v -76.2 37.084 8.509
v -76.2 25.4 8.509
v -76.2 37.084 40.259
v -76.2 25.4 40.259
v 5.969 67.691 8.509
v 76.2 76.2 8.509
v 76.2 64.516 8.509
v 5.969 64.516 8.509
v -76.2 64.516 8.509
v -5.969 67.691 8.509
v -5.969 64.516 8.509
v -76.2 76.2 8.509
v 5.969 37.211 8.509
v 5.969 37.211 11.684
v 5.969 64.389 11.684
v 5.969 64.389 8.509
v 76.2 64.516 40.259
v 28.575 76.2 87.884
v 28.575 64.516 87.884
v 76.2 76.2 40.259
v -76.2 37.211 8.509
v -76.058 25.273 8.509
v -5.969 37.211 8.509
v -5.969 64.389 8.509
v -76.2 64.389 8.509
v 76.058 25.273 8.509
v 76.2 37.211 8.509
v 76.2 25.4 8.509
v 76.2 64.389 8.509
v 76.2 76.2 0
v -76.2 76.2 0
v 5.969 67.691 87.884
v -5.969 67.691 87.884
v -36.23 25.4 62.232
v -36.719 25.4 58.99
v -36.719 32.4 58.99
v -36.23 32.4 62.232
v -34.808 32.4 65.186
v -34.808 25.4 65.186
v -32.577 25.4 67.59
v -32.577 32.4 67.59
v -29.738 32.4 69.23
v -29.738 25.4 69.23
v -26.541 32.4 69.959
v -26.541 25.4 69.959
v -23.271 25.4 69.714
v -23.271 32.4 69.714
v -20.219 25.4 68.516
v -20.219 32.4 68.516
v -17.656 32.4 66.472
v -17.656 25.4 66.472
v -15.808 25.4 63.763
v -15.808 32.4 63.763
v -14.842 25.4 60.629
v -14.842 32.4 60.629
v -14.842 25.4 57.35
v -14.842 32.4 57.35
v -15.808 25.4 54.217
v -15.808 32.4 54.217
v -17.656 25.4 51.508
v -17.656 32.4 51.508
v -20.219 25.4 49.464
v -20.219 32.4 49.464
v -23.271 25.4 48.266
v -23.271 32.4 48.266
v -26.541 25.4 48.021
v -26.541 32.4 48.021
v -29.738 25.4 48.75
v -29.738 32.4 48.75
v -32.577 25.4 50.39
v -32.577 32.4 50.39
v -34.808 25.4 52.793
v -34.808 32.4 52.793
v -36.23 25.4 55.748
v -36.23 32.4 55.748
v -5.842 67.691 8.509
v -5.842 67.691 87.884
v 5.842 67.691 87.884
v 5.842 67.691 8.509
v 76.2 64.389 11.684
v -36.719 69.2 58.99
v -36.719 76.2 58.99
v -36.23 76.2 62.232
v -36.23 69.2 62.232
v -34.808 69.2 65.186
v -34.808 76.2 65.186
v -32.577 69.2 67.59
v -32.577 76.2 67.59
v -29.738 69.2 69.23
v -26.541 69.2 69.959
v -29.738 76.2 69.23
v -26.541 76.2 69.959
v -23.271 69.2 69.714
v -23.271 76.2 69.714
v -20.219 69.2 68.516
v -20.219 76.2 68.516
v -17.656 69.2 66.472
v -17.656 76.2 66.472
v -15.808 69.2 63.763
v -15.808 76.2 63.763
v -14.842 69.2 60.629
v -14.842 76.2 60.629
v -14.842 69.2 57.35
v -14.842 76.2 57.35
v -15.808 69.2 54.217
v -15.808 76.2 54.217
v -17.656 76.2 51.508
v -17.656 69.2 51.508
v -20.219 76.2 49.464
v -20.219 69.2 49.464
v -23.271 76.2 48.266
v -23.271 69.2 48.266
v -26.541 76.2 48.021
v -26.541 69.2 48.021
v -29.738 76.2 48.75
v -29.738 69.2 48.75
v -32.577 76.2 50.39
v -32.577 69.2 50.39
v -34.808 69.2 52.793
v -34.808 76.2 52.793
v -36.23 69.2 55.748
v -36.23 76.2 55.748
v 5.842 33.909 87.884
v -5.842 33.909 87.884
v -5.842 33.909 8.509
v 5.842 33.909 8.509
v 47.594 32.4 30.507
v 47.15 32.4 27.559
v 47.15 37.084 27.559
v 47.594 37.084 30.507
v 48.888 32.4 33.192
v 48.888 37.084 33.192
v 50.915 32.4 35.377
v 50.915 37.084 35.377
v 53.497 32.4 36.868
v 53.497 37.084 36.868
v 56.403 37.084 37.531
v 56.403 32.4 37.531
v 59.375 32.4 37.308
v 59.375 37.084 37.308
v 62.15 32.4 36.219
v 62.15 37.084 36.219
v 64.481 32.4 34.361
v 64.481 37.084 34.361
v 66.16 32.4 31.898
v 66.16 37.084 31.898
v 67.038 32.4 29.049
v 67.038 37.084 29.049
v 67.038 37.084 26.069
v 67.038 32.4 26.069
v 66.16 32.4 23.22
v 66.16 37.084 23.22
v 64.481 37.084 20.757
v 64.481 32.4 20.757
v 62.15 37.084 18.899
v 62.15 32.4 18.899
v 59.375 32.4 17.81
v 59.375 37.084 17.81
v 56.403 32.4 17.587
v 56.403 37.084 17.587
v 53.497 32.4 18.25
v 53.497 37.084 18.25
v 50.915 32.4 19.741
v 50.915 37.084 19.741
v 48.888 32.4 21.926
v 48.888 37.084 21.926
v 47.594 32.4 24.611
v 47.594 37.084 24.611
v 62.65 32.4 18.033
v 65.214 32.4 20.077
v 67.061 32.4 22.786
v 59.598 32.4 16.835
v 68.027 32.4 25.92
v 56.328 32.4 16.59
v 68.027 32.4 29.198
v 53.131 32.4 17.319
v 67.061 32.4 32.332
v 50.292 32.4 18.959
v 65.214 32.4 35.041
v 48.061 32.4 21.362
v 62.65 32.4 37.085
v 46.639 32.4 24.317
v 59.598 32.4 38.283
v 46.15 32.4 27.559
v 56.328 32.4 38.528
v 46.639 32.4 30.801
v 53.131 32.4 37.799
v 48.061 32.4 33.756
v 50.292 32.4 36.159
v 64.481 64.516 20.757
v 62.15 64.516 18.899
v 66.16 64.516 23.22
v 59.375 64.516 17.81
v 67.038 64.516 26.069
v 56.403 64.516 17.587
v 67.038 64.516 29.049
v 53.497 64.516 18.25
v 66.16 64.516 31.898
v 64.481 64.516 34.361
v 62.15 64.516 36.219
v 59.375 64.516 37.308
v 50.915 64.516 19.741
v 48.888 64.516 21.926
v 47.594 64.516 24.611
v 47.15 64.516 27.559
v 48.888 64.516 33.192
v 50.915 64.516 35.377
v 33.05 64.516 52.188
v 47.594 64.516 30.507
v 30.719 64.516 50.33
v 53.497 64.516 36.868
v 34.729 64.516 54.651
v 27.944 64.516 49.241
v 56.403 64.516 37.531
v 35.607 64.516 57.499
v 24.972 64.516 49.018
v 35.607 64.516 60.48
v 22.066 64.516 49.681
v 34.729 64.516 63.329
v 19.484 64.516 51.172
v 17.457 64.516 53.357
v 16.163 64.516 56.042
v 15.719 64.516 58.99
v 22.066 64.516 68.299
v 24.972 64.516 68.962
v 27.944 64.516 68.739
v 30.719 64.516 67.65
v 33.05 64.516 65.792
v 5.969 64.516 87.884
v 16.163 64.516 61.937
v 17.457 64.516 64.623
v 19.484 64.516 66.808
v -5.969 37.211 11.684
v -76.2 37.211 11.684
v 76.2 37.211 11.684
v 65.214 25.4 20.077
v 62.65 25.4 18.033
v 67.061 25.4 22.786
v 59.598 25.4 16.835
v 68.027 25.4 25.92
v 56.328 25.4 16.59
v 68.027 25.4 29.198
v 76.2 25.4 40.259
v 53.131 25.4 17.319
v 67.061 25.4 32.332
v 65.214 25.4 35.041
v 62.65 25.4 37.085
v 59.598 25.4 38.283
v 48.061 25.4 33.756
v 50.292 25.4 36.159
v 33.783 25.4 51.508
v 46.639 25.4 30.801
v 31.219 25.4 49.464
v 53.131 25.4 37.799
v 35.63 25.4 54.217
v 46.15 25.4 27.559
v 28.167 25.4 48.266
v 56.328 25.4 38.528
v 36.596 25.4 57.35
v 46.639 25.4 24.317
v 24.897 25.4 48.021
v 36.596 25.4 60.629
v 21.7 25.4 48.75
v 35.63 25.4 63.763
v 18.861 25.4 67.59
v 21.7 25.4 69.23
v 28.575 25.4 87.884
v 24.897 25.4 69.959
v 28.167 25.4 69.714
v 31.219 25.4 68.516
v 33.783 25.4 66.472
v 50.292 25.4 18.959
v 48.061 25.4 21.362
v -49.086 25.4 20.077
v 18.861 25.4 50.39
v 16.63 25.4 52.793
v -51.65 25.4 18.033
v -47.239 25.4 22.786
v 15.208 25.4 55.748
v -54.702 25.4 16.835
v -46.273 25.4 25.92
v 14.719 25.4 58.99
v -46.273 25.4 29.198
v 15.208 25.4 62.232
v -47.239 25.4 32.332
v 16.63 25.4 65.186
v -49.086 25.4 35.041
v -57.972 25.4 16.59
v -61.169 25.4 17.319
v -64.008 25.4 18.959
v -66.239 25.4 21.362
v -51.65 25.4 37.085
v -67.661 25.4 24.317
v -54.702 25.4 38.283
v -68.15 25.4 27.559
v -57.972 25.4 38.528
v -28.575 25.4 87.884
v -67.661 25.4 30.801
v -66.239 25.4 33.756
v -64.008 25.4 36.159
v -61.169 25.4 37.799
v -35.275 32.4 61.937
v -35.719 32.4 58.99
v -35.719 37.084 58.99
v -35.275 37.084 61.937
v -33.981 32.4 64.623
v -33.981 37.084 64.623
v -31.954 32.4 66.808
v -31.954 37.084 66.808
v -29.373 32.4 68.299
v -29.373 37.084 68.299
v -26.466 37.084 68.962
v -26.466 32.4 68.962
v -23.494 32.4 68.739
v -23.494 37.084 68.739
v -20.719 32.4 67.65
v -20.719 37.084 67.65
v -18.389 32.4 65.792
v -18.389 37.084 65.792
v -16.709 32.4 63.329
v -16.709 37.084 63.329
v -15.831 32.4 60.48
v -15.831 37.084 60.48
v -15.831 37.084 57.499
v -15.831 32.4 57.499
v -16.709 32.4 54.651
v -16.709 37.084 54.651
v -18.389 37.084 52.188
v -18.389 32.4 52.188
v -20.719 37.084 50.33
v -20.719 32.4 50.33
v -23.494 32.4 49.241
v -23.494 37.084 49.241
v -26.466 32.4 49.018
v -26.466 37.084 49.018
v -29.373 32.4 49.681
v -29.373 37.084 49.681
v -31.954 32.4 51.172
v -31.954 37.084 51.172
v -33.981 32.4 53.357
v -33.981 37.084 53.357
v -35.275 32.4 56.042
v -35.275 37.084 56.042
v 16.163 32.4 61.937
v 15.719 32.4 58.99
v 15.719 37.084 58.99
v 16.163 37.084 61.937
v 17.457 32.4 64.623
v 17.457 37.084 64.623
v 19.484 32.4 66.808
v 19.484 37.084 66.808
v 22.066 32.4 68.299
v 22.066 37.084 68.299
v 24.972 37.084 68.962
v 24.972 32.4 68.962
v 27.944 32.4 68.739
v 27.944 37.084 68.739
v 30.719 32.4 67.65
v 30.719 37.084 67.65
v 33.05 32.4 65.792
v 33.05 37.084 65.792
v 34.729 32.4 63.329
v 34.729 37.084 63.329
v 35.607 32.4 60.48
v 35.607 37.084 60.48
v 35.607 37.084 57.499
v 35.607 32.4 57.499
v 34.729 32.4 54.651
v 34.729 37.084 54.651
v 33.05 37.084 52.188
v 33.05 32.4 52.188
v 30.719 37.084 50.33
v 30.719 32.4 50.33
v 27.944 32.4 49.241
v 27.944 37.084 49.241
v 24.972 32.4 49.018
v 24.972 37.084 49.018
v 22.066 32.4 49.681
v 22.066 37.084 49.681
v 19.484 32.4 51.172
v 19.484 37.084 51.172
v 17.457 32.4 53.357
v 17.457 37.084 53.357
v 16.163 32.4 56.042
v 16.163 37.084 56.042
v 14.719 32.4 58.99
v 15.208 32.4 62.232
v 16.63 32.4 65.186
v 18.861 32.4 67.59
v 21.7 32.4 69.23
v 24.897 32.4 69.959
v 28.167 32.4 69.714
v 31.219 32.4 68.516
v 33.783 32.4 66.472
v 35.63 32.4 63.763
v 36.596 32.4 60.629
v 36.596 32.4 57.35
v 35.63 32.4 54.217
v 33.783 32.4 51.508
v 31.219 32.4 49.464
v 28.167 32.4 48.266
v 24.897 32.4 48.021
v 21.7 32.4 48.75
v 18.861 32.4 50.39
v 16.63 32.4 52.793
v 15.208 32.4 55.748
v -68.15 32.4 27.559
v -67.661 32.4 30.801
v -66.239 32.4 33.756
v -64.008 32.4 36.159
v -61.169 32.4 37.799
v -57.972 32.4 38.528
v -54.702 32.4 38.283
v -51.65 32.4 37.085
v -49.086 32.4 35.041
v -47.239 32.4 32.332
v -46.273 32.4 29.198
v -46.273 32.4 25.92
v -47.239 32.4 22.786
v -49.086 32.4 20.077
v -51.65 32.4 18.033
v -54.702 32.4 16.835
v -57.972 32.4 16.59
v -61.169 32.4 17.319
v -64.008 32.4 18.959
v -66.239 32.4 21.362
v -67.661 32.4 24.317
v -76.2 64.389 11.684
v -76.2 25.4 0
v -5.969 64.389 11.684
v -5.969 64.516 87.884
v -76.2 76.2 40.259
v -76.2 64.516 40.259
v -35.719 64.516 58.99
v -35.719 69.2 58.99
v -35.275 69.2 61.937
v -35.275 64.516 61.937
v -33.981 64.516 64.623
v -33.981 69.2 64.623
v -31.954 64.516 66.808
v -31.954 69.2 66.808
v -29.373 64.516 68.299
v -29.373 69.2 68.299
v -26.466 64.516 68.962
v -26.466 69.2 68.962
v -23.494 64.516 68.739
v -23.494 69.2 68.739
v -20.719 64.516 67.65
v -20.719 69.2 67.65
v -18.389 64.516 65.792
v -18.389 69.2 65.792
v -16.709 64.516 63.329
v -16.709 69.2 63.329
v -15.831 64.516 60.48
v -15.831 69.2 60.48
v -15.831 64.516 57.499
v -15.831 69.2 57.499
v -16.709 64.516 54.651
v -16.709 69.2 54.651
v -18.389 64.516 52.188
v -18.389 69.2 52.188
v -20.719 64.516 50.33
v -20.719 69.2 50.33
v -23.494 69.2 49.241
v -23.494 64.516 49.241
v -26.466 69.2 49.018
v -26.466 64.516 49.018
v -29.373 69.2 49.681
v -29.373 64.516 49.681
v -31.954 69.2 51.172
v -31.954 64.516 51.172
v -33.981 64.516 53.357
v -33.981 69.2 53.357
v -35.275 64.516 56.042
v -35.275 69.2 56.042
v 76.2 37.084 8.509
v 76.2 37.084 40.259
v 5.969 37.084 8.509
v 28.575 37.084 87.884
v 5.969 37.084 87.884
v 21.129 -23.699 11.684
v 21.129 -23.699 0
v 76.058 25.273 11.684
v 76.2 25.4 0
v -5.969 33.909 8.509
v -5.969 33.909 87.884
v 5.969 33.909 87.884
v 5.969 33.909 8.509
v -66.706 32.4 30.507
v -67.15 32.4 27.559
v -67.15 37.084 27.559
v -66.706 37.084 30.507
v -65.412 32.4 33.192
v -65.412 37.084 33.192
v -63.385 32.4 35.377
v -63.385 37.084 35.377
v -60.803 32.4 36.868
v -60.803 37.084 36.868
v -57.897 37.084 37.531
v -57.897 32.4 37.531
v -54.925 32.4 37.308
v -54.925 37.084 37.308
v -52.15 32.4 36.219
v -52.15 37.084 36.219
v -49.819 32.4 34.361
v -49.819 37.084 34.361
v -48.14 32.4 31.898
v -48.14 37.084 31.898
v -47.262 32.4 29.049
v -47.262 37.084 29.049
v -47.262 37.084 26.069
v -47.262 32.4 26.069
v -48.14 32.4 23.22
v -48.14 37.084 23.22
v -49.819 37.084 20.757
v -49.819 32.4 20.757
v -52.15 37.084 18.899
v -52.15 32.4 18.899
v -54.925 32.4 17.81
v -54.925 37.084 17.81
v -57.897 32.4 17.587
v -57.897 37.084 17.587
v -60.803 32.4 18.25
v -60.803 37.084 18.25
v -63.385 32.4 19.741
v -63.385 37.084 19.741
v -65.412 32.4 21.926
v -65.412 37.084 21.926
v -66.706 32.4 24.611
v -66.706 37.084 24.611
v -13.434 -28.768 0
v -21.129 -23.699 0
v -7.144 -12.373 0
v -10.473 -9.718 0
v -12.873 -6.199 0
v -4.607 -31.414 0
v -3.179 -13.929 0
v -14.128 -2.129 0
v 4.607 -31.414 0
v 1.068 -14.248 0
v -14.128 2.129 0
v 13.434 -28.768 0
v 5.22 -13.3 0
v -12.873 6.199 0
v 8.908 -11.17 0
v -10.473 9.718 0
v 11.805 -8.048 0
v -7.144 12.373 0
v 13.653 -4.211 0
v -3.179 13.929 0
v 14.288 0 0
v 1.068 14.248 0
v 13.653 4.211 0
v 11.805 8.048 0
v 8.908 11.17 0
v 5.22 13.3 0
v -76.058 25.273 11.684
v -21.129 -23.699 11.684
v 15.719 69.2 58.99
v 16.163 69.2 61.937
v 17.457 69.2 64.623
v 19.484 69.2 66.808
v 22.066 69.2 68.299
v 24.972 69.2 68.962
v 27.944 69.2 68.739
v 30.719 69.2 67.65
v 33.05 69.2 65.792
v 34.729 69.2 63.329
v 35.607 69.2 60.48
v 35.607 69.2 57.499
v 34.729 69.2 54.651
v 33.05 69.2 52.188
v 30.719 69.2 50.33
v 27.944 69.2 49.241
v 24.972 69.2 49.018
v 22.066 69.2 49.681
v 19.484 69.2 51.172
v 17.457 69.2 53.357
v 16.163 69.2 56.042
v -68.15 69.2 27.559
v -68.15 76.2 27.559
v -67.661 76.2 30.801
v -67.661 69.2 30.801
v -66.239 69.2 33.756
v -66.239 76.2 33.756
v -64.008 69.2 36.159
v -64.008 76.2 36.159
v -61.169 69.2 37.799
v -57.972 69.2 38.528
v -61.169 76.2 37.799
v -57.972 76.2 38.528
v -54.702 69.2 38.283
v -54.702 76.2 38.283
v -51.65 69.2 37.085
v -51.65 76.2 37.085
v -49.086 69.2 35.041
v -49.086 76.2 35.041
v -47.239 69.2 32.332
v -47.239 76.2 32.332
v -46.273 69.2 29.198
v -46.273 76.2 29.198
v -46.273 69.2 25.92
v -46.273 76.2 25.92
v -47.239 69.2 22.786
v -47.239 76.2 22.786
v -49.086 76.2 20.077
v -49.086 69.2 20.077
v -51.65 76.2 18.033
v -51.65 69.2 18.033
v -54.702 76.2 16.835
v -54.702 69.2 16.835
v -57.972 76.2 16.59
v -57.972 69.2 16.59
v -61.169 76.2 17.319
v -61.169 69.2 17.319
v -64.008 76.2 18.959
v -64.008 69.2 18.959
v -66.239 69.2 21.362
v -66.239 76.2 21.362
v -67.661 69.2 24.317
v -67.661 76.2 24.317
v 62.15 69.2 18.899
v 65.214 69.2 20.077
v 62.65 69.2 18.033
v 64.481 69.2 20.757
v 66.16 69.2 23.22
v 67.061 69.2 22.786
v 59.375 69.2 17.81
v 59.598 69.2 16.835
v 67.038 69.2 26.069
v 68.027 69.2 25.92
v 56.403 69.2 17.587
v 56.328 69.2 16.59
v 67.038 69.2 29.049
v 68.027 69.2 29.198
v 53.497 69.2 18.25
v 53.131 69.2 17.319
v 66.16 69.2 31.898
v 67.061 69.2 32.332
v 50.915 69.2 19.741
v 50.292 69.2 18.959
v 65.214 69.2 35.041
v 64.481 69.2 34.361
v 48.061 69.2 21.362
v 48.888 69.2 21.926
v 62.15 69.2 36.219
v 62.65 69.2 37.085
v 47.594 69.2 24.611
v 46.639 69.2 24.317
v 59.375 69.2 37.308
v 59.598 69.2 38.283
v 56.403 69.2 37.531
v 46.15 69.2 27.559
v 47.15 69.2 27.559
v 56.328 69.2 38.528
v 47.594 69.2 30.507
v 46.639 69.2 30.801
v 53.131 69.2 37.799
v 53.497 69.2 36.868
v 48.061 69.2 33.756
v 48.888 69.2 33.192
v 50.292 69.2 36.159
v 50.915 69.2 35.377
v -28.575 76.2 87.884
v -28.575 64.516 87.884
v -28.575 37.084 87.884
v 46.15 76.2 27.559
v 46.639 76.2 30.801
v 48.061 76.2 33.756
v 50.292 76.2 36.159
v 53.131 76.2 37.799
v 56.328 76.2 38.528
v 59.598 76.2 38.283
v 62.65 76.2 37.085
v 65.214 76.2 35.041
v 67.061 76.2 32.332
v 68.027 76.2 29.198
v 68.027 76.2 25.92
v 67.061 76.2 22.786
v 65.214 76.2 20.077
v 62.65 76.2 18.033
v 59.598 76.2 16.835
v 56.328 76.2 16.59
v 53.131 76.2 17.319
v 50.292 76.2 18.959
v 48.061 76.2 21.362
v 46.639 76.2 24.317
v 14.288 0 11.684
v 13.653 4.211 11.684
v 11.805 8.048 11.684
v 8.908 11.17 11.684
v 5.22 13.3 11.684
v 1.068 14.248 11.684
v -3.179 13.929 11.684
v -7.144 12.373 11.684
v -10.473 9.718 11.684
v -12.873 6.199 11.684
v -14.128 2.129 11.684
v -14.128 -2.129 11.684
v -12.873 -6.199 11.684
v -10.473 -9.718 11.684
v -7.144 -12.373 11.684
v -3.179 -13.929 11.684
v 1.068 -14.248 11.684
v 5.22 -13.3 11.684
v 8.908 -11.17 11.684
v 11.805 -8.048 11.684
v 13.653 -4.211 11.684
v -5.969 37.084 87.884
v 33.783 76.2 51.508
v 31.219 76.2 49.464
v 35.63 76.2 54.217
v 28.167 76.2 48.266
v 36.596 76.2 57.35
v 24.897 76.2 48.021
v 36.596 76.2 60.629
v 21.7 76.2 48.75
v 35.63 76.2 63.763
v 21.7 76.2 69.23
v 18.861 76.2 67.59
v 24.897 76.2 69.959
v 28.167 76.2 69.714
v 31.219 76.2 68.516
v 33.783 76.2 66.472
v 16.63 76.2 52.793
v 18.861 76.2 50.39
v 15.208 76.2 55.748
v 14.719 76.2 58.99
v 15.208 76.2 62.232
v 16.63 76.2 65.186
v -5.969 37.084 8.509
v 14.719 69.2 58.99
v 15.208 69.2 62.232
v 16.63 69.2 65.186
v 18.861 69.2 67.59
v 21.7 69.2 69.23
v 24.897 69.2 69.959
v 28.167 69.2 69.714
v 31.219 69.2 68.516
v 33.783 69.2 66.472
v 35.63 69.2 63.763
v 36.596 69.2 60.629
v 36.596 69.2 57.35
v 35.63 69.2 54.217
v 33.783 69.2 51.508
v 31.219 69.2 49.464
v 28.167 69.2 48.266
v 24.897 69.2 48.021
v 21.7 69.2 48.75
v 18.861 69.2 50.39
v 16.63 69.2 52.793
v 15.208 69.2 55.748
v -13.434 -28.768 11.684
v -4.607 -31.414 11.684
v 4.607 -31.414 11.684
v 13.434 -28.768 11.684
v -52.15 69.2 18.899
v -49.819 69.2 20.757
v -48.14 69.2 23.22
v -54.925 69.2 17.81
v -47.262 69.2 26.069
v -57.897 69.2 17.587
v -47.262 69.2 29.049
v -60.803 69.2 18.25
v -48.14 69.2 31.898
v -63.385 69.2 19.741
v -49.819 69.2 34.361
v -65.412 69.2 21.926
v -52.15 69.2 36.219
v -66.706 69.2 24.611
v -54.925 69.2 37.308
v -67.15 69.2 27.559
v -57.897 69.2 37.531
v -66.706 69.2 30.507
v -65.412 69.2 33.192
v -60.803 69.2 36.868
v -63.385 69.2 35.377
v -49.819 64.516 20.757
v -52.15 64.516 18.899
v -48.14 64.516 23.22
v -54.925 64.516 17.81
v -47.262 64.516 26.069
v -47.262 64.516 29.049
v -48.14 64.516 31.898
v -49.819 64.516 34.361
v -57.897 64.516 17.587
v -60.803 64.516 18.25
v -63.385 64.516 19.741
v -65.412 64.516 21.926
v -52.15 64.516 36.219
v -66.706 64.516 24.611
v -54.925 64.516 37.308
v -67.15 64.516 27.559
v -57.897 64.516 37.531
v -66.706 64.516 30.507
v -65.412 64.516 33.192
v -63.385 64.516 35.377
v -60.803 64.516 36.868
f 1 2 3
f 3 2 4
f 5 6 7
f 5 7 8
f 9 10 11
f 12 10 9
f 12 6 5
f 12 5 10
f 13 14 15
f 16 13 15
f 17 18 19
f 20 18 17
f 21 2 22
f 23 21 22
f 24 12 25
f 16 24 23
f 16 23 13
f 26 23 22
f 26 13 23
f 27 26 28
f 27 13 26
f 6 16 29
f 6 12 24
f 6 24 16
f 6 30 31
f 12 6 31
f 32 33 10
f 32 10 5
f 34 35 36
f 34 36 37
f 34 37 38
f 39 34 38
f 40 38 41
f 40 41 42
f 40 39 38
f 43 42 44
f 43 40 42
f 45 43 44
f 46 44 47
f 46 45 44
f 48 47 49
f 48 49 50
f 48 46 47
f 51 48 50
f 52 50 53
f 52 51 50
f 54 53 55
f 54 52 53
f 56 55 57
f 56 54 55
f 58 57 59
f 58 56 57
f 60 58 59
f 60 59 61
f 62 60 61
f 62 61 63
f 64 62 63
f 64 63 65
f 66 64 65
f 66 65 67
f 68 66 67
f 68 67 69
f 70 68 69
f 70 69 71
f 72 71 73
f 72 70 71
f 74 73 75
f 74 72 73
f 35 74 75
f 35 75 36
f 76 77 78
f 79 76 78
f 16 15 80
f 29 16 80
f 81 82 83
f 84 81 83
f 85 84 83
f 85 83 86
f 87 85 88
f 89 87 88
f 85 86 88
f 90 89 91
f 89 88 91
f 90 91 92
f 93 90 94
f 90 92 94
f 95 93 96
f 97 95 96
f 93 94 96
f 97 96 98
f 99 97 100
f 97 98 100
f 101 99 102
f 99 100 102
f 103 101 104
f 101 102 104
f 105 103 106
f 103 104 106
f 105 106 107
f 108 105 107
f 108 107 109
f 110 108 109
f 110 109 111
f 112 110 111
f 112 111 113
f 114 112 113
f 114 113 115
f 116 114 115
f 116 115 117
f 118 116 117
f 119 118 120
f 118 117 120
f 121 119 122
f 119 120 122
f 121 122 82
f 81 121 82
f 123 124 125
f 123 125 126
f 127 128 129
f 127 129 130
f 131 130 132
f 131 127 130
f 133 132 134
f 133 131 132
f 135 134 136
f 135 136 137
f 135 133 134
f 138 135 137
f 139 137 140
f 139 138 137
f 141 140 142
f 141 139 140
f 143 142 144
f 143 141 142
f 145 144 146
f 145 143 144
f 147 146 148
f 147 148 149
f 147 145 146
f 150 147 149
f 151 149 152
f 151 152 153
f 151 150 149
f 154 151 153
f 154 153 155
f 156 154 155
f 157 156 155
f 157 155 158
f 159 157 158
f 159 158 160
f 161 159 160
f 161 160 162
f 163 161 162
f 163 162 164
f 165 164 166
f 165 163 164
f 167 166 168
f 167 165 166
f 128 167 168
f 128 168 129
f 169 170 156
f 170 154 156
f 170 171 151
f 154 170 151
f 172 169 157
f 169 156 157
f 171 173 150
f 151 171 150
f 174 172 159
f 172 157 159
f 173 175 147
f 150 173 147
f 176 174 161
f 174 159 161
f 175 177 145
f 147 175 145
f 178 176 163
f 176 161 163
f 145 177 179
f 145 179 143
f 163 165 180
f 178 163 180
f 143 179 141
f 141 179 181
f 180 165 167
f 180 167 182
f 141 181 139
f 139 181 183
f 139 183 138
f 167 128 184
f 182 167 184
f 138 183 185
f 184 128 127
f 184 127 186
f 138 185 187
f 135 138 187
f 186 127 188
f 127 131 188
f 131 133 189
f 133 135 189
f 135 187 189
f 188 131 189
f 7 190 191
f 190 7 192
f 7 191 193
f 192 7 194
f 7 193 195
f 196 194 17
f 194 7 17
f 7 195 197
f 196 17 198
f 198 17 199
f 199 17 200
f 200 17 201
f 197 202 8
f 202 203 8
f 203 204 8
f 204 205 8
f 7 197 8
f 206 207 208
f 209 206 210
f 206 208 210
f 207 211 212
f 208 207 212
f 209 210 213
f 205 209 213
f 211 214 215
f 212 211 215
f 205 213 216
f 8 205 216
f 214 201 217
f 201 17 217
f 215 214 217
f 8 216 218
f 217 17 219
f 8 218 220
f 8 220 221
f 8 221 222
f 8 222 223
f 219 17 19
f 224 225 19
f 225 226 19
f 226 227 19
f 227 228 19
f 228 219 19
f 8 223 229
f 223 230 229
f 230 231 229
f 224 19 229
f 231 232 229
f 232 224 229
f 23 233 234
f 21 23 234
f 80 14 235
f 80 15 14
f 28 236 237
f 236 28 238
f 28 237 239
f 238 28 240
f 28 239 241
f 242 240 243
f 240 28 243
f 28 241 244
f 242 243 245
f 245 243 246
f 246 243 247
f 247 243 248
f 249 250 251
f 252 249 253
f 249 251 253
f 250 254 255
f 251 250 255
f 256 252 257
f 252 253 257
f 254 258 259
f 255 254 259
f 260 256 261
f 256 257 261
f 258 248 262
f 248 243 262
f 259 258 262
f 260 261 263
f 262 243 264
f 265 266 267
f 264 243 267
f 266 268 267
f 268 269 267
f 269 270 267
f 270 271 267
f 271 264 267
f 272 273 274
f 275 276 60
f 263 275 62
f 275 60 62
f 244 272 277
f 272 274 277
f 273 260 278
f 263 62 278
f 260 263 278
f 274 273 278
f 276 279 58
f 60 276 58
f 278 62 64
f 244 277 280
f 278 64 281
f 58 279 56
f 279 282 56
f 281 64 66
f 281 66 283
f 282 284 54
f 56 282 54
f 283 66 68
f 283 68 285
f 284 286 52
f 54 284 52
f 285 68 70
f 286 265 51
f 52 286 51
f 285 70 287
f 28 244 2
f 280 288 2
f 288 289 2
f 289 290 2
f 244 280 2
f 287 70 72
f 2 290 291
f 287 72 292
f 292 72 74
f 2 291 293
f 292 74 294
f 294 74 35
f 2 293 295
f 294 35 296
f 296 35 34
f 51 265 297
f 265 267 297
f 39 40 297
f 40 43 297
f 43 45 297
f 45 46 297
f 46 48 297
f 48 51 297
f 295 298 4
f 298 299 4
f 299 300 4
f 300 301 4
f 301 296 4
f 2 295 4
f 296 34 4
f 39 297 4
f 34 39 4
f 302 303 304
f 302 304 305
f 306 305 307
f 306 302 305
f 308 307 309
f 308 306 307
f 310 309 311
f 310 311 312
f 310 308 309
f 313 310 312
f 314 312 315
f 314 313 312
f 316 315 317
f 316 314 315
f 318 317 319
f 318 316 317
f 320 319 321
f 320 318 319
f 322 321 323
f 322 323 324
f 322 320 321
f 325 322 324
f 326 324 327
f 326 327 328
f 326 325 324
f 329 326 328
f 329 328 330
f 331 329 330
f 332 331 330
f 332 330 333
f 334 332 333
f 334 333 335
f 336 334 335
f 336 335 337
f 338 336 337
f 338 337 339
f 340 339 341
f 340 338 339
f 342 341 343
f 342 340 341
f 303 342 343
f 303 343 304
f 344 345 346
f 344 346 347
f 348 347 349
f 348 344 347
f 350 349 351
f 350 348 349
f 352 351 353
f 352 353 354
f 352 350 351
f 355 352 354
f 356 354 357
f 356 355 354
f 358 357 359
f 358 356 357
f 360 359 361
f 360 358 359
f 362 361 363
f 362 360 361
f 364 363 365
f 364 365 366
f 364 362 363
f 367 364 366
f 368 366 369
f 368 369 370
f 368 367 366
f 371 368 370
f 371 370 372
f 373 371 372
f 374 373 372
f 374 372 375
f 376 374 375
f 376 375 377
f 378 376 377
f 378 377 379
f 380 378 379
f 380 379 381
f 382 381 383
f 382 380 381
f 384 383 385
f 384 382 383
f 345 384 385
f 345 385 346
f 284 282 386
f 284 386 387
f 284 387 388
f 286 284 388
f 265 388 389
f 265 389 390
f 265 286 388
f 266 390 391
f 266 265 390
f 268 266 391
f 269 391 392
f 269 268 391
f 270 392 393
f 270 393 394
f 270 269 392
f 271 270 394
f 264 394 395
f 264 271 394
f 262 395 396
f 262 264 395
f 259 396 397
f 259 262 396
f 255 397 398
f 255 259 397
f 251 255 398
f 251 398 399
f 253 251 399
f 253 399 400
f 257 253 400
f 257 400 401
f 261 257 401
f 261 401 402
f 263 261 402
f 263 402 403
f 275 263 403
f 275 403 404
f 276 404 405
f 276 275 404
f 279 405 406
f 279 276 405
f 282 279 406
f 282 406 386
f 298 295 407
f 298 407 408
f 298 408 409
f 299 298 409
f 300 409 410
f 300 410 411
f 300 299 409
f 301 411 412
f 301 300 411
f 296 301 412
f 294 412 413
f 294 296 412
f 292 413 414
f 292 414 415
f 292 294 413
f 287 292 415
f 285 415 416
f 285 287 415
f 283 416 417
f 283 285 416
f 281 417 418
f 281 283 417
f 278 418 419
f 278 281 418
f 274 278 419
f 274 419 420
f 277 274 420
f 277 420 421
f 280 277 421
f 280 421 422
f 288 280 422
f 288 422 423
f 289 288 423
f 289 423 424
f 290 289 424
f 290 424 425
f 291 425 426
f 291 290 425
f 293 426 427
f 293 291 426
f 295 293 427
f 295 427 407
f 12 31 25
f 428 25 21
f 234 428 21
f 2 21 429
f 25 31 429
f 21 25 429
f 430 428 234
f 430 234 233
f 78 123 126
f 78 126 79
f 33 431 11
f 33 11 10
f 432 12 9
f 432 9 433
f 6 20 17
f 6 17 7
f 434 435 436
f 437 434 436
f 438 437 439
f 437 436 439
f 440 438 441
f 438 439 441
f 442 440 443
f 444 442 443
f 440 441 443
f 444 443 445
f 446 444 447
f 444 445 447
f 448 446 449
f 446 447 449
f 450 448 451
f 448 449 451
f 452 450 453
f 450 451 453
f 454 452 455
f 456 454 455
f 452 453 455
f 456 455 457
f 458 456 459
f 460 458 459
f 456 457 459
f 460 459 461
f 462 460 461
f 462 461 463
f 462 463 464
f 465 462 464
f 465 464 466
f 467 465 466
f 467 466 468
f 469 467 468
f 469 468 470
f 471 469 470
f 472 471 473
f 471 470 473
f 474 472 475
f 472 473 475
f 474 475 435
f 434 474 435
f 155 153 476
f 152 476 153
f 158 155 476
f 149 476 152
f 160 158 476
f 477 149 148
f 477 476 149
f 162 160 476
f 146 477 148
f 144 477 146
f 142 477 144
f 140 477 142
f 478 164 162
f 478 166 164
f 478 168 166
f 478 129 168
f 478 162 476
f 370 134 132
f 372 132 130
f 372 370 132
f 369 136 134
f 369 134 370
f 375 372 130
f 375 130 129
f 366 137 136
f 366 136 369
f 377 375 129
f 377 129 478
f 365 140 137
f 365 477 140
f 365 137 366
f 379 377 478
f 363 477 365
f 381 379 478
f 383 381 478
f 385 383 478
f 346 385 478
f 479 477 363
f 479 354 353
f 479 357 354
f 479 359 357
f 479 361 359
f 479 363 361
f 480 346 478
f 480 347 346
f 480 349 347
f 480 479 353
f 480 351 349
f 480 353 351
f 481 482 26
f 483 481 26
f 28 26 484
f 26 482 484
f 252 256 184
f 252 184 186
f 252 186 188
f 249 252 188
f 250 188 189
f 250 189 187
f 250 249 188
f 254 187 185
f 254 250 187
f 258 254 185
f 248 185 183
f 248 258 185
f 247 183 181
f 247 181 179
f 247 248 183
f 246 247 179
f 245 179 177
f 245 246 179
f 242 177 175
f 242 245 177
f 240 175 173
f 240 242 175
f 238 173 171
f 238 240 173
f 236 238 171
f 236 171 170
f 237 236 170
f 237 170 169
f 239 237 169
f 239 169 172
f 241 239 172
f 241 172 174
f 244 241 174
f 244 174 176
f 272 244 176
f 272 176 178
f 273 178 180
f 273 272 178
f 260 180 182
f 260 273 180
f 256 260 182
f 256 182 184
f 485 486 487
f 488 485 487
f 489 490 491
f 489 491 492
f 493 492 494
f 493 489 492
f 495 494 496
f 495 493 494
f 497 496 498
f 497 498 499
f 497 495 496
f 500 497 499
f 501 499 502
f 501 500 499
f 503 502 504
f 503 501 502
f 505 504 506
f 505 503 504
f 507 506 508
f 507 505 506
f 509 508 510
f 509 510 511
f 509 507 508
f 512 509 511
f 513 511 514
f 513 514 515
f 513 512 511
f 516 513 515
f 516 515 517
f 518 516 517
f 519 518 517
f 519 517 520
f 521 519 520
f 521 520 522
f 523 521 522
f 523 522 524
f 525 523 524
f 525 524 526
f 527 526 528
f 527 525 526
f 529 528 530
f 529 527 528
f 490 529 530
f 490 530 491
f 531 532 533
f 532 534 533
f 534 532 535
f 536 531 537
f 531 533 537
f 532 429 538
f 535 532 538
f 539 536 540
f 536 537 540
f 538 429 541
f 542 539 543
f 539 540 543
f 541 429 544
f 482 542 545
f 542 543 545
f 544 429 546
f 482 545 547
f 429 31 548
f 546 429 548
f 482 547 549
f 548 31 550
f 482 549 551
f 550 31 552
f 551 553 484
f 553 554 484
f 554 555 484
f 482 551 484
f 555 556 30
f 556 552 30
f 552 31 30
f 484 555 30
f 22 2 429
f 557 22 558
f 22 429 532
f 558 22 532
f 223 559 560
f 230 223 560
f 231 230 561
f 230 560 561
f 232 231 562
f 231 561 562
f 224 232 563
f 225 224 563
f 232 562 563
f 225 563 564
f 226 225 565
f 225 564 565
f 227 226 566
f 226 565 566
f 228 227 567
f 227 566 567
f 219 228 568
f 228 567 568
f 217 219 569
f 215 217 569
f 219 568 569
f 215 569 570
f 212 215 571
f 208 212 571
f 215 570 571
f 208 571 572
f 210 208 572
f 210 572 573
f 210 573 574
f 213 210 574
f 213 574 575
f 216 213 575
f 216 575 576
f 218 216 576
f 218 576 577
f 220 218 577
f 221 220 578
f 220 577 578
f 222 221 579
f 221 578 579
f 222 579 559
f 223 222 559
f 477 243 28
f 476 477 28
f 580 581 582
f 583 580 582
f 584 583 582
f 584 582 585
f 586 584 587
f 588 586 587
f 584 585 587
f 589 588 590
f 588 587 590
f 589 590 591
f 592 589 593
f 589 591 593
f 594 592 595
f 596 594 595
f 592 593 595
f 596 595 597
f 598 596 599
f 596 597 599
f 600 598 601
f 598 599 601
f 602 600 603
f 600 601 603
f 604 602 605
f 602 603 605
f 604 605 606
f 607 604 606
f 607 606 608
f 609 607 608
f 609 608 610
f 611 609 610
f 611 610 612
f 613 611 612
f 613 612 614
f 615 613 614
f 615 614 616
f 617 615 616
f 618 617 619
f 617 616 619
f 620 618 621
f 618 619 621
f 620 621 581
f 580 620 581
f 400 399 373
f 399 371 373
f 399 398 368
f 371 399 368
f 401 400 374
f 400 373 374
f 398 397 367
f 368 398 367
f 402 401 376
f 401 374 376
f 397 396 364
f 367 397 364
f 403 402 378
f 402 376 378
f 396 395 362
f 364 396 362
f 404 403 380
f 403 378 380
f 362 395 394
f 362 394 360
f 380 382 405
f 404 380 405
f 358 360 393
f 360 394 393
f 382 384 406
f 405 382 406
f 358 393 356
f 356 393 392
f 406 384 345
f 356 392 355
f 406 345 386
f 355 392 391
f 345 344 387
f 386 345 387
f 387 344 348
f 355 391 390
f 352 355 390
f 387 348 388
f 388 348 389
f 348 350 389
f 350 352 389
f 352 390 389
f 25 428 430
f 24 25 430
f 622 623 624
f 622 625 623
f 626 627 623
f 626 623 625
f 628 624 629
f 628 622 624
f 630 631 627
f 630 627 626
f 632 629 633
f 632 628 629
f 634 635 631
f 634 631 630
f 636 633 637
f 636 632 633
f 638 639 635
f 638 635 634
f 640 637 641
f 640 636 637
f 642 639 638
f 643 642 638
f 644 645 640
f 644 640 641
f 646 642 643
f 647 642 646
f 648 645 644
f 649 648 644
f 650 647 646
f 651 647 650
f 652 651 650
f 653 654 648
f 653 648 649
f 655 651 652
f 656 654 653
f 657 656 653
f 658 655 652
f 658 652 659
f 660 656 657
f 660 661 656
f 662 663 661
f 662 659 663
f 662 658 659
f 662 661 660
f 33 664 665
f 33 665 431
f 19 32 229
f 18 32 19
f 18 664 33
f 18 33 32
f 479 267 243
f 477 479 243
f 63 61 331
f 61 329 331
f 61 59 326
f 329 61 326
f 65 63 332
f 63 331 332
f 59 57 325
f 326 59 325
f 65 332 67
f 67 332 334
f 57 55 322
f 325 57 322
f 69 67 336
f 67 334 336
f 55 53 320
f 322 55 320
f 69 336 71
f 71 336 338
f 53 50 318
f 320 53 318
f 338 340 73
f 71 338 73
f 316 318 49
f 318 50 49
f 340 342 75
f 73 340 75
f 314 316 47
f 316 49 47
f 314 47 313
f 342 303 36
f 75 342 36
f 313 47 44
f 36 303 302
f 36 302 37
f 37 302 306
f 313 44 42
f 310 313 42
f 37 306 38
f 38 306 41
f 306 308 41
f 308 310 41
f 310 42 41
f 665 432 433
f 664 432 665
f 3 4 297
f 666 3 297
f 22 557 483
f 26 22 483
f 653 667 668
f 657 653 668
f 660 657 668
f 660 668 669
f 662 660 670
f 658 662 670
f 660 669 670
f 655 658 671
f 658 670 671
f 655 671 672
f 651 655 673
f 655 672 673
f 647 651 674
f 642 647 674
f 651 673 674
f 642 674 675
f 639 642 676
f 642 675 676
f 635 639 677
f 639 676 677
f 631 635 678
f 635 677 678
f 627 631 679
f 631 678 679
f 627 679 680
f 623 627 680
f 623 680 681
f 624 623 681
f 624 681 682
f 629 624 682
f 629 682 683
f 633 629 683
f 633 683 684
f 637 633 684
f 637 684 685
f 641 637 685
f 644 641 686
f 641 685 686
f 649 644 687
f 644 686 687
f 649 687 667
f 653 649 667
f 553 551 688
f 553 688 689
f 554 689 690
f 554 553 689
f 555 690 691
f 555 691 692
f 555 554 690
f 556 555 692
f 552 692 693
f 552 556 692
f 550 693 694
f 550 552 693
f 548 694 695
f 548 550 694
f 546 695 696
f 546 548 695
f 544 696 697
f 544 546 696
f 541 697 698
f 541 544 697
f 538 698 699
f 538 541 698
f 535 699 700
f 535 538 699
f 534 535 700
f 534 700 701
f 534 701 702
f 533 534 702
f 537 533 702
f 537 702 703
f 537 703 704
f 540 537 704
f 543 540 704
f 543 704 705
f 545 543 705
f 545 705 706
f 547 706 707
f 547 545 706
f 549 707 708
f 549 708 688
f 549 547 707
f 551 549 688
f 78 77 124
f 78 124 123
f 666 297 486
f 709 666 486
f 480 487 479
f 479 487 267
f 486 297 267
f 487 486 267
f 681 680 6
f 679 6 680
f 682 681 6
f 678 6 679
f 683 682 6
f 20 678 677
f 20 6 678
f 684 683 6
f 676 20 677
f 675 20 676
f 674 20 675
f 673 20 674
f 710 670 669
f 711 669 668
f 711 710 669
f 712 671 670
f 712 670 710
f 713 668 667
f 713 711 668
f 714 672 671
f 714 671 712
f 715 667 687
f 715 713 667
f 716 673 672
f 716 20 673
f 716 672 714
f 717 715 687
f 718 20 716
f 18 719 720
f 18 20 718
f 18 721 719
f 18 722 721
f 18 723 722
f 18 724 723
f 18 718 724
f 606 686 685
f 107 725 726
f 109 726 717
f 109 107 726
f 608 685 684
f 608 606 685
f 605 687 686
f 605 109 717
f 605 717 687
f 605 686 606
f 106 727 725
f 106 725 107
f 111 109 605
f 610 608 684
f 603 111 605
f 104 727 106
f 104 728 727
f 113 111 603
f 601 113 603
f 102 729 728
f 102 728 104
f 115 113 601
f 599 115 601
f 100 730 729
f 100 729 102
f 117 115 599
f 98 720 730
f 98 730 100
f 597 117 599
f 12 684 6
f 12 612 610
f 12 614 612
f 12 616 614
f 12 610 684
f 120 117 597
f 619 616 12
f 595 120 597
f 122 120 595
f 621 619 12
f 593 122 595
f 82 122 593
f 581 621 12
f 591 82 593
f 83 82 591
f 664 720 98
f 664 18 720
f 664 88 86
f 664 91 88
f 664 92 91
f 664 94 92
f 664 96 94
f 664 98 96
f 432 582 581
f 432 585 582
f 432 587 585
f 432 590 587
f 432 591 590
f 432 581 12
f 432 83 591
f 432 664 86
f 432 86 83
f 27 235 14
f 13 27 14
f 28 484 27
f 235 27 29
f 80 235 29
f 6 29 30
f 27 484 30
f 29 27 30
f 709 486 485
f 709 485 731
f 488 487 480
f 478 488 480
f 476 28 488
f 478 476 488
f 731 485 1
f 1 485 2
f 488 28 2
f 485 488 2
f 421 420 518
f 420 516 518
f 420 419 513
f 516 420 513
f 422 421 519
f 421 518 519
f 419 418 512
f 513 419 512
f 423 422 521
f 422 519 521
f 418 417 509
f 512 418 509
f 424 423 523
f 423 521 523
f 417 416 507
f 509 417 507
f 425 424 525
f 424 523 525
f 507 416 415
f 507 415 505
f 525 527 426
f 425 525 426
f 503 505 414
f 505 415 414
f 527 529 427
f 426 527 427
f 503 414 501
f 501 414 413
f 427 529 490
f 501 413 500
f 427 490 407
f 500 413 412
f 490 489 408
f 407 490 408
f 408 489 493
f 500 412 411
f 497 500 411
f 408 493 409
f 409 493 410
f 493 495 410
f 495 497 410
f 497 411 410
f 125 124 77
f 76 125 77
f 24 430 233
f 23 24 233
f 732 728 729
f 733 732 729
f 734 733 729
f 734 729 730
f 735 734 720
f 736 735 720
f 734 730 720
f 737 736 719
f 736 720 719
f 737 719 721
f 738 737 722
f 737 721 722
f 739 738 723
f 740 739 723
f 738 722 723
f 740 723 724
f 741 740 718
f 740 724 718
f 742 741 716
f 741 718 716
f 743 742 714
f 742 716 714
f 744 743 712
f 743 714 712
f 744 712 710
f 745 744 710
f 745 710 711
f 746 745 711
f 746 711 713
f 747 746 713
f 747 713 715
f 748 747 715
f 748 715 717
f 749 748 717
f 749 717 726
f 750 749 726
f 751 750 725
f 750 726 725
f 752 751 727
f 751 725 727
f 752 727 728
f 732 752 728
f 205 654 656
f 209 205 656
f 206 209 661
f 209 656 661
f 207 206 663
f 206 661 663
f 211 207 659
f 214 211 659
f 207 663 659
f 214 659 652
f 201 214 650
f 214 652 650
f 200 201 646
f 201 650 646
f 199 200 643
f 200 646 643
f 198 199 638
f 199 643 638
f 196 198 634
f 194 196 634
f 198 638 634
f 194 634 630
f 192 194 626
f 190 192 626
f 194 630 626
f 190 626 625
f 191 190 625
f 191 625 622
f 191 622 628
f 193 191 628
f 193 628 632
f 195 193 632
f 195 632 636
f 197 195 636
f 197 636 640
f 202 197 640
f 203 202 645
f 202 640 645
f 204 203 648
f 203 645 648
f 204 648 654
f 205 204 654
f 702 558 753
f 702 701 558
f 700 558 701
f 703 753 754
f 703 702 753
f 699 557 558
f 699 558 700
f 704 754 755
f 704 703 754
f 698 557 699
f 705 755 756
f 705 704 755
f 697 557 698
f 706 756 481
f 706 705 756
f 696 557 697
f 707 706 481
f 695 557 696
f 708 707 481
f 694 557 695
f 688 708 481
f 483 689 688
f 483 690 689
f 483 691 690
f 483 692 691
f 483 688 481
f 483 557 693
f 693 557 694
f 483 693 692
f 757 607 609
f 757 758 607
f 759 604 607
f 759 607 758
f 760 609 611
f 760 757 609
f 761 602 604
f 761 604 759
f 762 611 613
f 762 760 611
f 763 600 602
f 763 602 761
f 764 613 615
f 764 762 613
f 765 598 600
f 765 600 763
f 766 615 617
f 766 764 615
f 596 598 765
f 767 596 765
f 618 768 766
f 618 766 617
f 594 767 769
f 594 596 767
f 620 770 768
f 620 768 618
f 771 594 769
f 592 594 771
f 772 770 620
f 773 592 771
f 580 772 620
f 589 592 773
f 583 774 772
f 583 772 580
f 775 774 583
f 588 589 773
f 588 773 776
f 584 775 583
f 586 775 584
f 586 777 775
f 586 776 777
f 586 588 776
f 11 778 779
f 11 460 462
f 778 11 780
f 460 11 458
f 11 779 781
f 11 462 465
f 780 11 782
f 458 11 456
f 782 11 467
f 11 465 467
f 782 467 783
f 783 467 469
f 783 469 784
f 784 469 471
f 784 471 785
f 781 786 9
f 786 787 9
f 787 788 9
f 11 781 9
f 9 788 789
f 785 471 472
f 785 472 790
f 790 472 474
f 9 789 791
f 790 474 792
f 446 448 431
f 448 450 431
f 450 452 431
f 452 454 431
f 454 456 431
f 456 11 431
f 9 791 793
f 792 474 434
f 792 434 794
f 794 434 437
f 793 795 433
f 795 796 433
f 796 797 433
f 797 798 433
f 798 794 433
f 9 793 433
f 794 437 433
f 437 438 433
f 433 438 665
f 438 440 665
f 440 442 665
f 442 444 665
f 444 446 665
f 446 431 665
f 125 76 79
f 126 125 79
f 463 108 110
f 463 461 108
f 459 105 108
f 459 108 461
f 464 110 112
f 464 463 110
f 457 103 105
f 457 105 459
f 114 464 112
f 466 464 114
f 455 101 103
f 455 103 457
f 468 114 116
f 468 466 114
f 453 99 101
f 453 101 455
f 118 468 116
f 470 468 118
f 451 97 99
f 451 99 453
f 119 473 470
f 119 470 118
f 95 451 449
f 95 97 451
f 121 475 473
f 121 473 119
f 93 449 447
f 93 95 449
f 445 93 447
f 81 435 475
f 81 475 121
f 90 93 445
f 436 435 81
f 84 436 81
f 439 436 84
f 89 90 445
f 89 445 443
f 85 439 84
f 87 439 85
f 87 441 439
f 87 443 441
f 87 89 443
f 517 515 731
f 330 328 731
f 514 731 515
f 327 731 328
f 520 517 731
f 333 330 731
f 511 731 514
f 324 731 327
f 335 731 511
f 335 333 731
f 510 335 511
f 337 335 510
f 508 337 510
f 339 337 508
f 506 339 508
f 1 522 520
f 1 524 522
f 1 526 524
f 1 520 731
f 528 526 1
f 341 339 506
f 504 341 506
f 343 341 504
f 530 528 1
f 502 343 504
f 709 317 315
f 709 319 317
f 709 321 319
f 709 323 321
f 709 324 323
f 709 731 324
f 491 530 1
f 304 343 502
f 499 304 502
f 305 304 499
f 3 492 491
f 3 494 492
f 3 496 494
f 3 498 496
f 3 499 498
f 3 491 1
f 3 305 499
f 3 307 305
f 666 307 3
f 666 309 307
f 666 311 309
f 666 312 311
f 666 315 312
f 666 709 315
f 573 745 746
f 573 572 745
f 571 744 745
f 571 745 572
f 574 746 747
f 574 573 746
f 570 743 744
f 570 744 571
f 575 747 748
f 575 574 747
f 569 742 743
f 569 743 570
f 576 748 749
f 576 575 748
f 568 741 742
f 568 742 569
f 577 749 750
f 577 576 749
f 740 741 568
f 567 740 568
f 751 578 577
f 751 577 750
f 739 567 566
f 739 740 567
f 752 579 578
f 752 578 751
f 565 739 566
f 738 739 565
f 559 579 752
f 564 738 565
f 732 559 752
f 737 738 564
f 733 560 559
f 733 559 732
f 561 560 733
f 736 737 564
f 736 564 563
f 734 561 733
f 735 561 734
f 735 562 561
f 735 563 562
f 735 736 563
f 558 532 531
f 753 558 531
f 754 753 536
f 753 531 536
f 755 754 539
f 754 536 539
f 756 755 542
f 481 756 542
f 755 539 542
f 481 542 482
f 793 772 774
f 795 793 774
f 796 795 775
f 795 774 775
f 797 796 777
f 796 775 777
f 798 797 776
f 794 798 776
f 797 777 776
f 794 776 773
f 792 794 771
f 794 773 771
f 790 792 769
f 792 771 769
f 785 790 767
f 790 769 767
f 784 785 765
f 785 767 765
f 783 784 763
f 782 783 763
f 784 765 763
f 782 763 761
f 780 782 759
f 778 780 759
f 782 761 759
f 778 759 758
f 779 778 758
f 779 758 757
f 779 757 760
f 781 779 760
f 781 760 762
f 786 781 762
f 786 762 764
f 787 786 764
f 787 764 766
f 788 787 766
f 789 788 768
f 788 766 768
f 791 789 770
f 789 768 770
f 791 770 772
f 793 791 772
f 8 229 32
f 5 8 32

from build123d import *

# Parameters (mm, degrees)
F0_R      = 14.2875
F1_DEPTH  = 11.684
F3_DEPTH  = 11.684
F4_R      = 11
F5_DEPTH  = 7
F6_R      = 10
F7_DEPTH  = 4.684
F13_W     = 11.684
F13_H     = 33.782
F14_DEPTH = 79.375
F16_DEPTH = 3.175
F17_W     = 11.938
F17_H     = 33.782
F18_DEPTH = 79.375


with BuildPart() as f1:
    # F0 (on Top) → F1 (new body)
    with BuildSketch(Plane.XY):
        with BuildLine():
            Line((-76.2, 25.4), (-21.1287915932, -23.6988747795))
            ThreePointArc((-21.1287915932, -23.6988747795), (0, -31.75), (21.1287915932, -23.6988747795))
            Line((21.1287915932, -23.6988747795), (76.2, 25.4))
            Line((76.2, 25.4), (76.2, 76.2))
            Line((76.2, 76.2), (-76.2, 76.2))
            Line((-76.2, 76.2), (-76.2, 25.4))
        make_face()
        Circle(F0_R, mode=Mode.SUBTRACT)
    extrude(amount=F1_DEPTH)

    # F15 (on face) → F16 (cut, through all)
    with BuildSketch(Plane.XY.offset(11.684)):
        Polygon((76.2, 76.2), (-76.2, 76.2), (-76.2, 64.389), (-5.969, 64.389), (-5.969, 37.211), (-76.2, 37.211), (-76.2, 25.273), (76.2, 25.273), (76.2, 37.211), (5.969, 37.211), (5.969, 64.389), (76.2, 64.389), align=None)
    extrude(amount=-F16_DEPTH, mode=Mode.SUBTRACT)


with BuildPart() as f3:
    # F2 (on face) → F3 (new body)
    with BuildSketch(Plane(origin=(0, 76.2, 0), x_dir=(-1, 0, 0), z_dir=(0, 1, 0))):
        Polygon((-76.2, 40.259), (-76.2, 8.509), (76.2, 8.509), (76.2, 40.259), (28.575, 87.884), (-28.575, 87.884), align=None)
    extrude(amount=-F3_DEPTH)

    # F4 (on face) → F5 (cut)
    with BuildSketch(Plane(origin=(0, 76.2, 0), x_dir=(-1, 0, 0), z_dir=(0, 1, 0))):
        with Locations((-57.15, 27.559)):
            Circle(F4_R)
        with Locations((-25.7191035763, 58.9898964237)):
            Circle(F4_R)
        with Locations((25.7191035763, 58.9898964237)):
            Circle(F4_R)
        with Locations((57.15, 27.559)):
            Circle(F4_R)
    extrude(amount=-F5_DEPTH, mode=Mode.SUBTRACT)

    # F6 (on face) → F7 (cut, through all)
    with BuildSketch(Plane(origin=(0, 69.2, 0), x_dir=(-1, 0, 0), z_dir=(0, 1, 0))):
        with Locations((-25.7191035763, 58.9898964237)):
            Circle(F6_R)
        with Locations((-57.15, 27.559)):
            Circle(F6_R)
        with Locations((25.7191035763, 58.9898964237)):
            Circle(F6_R)
        with Locations((57.15, 27.559)):
            Circle(F6_R)
    extrude(amount=-F7_DEPTH, mode=Mode.SUBTRACT)


with BuildPart() as f12_1:
    # F12: instance of F3
    add(f3.part.mirror(Plane(origin=(-76.2, 50.8, 11.684), x_dir=(0, 0, -1), z_dir=(0, 1, 0))))


with BuildPart() as f14:
    # F13 (on face) → F14 (new body, through all)
    with BuildSketch(Plane.XY.offset(87.884)):
        with Locations((0, 50.8)):
            Rectangle(F13_W, F13_H)
    extrude(amount=-F14_DEPTH)


with BuildPart() as f18_tool:
    # F17 (on face) → F18 (new body, through all)
    with BuildSketch(Plane.XY.offset(87.884)):
        with Locations((0, 50.8)):
            Rectangle(F17_W, F17_H)
    extrude(amount=-F18_DEPTH)


with BuildPart() as f3_1:
    add(f3.part)

    # F18: cut by f18_tool
    add(f18_tool.part, mode=Mode.SUBTRACT)


with BuildPart() as f12_1_1:
    add(f12_1.part)

    # F18: cut by f18_tool
    add(f18_tool.part, mode=Mode.SUBTRACT)


solid = Compound([f1.part, f14.part, f3_1.part, f12_1_1.part])
